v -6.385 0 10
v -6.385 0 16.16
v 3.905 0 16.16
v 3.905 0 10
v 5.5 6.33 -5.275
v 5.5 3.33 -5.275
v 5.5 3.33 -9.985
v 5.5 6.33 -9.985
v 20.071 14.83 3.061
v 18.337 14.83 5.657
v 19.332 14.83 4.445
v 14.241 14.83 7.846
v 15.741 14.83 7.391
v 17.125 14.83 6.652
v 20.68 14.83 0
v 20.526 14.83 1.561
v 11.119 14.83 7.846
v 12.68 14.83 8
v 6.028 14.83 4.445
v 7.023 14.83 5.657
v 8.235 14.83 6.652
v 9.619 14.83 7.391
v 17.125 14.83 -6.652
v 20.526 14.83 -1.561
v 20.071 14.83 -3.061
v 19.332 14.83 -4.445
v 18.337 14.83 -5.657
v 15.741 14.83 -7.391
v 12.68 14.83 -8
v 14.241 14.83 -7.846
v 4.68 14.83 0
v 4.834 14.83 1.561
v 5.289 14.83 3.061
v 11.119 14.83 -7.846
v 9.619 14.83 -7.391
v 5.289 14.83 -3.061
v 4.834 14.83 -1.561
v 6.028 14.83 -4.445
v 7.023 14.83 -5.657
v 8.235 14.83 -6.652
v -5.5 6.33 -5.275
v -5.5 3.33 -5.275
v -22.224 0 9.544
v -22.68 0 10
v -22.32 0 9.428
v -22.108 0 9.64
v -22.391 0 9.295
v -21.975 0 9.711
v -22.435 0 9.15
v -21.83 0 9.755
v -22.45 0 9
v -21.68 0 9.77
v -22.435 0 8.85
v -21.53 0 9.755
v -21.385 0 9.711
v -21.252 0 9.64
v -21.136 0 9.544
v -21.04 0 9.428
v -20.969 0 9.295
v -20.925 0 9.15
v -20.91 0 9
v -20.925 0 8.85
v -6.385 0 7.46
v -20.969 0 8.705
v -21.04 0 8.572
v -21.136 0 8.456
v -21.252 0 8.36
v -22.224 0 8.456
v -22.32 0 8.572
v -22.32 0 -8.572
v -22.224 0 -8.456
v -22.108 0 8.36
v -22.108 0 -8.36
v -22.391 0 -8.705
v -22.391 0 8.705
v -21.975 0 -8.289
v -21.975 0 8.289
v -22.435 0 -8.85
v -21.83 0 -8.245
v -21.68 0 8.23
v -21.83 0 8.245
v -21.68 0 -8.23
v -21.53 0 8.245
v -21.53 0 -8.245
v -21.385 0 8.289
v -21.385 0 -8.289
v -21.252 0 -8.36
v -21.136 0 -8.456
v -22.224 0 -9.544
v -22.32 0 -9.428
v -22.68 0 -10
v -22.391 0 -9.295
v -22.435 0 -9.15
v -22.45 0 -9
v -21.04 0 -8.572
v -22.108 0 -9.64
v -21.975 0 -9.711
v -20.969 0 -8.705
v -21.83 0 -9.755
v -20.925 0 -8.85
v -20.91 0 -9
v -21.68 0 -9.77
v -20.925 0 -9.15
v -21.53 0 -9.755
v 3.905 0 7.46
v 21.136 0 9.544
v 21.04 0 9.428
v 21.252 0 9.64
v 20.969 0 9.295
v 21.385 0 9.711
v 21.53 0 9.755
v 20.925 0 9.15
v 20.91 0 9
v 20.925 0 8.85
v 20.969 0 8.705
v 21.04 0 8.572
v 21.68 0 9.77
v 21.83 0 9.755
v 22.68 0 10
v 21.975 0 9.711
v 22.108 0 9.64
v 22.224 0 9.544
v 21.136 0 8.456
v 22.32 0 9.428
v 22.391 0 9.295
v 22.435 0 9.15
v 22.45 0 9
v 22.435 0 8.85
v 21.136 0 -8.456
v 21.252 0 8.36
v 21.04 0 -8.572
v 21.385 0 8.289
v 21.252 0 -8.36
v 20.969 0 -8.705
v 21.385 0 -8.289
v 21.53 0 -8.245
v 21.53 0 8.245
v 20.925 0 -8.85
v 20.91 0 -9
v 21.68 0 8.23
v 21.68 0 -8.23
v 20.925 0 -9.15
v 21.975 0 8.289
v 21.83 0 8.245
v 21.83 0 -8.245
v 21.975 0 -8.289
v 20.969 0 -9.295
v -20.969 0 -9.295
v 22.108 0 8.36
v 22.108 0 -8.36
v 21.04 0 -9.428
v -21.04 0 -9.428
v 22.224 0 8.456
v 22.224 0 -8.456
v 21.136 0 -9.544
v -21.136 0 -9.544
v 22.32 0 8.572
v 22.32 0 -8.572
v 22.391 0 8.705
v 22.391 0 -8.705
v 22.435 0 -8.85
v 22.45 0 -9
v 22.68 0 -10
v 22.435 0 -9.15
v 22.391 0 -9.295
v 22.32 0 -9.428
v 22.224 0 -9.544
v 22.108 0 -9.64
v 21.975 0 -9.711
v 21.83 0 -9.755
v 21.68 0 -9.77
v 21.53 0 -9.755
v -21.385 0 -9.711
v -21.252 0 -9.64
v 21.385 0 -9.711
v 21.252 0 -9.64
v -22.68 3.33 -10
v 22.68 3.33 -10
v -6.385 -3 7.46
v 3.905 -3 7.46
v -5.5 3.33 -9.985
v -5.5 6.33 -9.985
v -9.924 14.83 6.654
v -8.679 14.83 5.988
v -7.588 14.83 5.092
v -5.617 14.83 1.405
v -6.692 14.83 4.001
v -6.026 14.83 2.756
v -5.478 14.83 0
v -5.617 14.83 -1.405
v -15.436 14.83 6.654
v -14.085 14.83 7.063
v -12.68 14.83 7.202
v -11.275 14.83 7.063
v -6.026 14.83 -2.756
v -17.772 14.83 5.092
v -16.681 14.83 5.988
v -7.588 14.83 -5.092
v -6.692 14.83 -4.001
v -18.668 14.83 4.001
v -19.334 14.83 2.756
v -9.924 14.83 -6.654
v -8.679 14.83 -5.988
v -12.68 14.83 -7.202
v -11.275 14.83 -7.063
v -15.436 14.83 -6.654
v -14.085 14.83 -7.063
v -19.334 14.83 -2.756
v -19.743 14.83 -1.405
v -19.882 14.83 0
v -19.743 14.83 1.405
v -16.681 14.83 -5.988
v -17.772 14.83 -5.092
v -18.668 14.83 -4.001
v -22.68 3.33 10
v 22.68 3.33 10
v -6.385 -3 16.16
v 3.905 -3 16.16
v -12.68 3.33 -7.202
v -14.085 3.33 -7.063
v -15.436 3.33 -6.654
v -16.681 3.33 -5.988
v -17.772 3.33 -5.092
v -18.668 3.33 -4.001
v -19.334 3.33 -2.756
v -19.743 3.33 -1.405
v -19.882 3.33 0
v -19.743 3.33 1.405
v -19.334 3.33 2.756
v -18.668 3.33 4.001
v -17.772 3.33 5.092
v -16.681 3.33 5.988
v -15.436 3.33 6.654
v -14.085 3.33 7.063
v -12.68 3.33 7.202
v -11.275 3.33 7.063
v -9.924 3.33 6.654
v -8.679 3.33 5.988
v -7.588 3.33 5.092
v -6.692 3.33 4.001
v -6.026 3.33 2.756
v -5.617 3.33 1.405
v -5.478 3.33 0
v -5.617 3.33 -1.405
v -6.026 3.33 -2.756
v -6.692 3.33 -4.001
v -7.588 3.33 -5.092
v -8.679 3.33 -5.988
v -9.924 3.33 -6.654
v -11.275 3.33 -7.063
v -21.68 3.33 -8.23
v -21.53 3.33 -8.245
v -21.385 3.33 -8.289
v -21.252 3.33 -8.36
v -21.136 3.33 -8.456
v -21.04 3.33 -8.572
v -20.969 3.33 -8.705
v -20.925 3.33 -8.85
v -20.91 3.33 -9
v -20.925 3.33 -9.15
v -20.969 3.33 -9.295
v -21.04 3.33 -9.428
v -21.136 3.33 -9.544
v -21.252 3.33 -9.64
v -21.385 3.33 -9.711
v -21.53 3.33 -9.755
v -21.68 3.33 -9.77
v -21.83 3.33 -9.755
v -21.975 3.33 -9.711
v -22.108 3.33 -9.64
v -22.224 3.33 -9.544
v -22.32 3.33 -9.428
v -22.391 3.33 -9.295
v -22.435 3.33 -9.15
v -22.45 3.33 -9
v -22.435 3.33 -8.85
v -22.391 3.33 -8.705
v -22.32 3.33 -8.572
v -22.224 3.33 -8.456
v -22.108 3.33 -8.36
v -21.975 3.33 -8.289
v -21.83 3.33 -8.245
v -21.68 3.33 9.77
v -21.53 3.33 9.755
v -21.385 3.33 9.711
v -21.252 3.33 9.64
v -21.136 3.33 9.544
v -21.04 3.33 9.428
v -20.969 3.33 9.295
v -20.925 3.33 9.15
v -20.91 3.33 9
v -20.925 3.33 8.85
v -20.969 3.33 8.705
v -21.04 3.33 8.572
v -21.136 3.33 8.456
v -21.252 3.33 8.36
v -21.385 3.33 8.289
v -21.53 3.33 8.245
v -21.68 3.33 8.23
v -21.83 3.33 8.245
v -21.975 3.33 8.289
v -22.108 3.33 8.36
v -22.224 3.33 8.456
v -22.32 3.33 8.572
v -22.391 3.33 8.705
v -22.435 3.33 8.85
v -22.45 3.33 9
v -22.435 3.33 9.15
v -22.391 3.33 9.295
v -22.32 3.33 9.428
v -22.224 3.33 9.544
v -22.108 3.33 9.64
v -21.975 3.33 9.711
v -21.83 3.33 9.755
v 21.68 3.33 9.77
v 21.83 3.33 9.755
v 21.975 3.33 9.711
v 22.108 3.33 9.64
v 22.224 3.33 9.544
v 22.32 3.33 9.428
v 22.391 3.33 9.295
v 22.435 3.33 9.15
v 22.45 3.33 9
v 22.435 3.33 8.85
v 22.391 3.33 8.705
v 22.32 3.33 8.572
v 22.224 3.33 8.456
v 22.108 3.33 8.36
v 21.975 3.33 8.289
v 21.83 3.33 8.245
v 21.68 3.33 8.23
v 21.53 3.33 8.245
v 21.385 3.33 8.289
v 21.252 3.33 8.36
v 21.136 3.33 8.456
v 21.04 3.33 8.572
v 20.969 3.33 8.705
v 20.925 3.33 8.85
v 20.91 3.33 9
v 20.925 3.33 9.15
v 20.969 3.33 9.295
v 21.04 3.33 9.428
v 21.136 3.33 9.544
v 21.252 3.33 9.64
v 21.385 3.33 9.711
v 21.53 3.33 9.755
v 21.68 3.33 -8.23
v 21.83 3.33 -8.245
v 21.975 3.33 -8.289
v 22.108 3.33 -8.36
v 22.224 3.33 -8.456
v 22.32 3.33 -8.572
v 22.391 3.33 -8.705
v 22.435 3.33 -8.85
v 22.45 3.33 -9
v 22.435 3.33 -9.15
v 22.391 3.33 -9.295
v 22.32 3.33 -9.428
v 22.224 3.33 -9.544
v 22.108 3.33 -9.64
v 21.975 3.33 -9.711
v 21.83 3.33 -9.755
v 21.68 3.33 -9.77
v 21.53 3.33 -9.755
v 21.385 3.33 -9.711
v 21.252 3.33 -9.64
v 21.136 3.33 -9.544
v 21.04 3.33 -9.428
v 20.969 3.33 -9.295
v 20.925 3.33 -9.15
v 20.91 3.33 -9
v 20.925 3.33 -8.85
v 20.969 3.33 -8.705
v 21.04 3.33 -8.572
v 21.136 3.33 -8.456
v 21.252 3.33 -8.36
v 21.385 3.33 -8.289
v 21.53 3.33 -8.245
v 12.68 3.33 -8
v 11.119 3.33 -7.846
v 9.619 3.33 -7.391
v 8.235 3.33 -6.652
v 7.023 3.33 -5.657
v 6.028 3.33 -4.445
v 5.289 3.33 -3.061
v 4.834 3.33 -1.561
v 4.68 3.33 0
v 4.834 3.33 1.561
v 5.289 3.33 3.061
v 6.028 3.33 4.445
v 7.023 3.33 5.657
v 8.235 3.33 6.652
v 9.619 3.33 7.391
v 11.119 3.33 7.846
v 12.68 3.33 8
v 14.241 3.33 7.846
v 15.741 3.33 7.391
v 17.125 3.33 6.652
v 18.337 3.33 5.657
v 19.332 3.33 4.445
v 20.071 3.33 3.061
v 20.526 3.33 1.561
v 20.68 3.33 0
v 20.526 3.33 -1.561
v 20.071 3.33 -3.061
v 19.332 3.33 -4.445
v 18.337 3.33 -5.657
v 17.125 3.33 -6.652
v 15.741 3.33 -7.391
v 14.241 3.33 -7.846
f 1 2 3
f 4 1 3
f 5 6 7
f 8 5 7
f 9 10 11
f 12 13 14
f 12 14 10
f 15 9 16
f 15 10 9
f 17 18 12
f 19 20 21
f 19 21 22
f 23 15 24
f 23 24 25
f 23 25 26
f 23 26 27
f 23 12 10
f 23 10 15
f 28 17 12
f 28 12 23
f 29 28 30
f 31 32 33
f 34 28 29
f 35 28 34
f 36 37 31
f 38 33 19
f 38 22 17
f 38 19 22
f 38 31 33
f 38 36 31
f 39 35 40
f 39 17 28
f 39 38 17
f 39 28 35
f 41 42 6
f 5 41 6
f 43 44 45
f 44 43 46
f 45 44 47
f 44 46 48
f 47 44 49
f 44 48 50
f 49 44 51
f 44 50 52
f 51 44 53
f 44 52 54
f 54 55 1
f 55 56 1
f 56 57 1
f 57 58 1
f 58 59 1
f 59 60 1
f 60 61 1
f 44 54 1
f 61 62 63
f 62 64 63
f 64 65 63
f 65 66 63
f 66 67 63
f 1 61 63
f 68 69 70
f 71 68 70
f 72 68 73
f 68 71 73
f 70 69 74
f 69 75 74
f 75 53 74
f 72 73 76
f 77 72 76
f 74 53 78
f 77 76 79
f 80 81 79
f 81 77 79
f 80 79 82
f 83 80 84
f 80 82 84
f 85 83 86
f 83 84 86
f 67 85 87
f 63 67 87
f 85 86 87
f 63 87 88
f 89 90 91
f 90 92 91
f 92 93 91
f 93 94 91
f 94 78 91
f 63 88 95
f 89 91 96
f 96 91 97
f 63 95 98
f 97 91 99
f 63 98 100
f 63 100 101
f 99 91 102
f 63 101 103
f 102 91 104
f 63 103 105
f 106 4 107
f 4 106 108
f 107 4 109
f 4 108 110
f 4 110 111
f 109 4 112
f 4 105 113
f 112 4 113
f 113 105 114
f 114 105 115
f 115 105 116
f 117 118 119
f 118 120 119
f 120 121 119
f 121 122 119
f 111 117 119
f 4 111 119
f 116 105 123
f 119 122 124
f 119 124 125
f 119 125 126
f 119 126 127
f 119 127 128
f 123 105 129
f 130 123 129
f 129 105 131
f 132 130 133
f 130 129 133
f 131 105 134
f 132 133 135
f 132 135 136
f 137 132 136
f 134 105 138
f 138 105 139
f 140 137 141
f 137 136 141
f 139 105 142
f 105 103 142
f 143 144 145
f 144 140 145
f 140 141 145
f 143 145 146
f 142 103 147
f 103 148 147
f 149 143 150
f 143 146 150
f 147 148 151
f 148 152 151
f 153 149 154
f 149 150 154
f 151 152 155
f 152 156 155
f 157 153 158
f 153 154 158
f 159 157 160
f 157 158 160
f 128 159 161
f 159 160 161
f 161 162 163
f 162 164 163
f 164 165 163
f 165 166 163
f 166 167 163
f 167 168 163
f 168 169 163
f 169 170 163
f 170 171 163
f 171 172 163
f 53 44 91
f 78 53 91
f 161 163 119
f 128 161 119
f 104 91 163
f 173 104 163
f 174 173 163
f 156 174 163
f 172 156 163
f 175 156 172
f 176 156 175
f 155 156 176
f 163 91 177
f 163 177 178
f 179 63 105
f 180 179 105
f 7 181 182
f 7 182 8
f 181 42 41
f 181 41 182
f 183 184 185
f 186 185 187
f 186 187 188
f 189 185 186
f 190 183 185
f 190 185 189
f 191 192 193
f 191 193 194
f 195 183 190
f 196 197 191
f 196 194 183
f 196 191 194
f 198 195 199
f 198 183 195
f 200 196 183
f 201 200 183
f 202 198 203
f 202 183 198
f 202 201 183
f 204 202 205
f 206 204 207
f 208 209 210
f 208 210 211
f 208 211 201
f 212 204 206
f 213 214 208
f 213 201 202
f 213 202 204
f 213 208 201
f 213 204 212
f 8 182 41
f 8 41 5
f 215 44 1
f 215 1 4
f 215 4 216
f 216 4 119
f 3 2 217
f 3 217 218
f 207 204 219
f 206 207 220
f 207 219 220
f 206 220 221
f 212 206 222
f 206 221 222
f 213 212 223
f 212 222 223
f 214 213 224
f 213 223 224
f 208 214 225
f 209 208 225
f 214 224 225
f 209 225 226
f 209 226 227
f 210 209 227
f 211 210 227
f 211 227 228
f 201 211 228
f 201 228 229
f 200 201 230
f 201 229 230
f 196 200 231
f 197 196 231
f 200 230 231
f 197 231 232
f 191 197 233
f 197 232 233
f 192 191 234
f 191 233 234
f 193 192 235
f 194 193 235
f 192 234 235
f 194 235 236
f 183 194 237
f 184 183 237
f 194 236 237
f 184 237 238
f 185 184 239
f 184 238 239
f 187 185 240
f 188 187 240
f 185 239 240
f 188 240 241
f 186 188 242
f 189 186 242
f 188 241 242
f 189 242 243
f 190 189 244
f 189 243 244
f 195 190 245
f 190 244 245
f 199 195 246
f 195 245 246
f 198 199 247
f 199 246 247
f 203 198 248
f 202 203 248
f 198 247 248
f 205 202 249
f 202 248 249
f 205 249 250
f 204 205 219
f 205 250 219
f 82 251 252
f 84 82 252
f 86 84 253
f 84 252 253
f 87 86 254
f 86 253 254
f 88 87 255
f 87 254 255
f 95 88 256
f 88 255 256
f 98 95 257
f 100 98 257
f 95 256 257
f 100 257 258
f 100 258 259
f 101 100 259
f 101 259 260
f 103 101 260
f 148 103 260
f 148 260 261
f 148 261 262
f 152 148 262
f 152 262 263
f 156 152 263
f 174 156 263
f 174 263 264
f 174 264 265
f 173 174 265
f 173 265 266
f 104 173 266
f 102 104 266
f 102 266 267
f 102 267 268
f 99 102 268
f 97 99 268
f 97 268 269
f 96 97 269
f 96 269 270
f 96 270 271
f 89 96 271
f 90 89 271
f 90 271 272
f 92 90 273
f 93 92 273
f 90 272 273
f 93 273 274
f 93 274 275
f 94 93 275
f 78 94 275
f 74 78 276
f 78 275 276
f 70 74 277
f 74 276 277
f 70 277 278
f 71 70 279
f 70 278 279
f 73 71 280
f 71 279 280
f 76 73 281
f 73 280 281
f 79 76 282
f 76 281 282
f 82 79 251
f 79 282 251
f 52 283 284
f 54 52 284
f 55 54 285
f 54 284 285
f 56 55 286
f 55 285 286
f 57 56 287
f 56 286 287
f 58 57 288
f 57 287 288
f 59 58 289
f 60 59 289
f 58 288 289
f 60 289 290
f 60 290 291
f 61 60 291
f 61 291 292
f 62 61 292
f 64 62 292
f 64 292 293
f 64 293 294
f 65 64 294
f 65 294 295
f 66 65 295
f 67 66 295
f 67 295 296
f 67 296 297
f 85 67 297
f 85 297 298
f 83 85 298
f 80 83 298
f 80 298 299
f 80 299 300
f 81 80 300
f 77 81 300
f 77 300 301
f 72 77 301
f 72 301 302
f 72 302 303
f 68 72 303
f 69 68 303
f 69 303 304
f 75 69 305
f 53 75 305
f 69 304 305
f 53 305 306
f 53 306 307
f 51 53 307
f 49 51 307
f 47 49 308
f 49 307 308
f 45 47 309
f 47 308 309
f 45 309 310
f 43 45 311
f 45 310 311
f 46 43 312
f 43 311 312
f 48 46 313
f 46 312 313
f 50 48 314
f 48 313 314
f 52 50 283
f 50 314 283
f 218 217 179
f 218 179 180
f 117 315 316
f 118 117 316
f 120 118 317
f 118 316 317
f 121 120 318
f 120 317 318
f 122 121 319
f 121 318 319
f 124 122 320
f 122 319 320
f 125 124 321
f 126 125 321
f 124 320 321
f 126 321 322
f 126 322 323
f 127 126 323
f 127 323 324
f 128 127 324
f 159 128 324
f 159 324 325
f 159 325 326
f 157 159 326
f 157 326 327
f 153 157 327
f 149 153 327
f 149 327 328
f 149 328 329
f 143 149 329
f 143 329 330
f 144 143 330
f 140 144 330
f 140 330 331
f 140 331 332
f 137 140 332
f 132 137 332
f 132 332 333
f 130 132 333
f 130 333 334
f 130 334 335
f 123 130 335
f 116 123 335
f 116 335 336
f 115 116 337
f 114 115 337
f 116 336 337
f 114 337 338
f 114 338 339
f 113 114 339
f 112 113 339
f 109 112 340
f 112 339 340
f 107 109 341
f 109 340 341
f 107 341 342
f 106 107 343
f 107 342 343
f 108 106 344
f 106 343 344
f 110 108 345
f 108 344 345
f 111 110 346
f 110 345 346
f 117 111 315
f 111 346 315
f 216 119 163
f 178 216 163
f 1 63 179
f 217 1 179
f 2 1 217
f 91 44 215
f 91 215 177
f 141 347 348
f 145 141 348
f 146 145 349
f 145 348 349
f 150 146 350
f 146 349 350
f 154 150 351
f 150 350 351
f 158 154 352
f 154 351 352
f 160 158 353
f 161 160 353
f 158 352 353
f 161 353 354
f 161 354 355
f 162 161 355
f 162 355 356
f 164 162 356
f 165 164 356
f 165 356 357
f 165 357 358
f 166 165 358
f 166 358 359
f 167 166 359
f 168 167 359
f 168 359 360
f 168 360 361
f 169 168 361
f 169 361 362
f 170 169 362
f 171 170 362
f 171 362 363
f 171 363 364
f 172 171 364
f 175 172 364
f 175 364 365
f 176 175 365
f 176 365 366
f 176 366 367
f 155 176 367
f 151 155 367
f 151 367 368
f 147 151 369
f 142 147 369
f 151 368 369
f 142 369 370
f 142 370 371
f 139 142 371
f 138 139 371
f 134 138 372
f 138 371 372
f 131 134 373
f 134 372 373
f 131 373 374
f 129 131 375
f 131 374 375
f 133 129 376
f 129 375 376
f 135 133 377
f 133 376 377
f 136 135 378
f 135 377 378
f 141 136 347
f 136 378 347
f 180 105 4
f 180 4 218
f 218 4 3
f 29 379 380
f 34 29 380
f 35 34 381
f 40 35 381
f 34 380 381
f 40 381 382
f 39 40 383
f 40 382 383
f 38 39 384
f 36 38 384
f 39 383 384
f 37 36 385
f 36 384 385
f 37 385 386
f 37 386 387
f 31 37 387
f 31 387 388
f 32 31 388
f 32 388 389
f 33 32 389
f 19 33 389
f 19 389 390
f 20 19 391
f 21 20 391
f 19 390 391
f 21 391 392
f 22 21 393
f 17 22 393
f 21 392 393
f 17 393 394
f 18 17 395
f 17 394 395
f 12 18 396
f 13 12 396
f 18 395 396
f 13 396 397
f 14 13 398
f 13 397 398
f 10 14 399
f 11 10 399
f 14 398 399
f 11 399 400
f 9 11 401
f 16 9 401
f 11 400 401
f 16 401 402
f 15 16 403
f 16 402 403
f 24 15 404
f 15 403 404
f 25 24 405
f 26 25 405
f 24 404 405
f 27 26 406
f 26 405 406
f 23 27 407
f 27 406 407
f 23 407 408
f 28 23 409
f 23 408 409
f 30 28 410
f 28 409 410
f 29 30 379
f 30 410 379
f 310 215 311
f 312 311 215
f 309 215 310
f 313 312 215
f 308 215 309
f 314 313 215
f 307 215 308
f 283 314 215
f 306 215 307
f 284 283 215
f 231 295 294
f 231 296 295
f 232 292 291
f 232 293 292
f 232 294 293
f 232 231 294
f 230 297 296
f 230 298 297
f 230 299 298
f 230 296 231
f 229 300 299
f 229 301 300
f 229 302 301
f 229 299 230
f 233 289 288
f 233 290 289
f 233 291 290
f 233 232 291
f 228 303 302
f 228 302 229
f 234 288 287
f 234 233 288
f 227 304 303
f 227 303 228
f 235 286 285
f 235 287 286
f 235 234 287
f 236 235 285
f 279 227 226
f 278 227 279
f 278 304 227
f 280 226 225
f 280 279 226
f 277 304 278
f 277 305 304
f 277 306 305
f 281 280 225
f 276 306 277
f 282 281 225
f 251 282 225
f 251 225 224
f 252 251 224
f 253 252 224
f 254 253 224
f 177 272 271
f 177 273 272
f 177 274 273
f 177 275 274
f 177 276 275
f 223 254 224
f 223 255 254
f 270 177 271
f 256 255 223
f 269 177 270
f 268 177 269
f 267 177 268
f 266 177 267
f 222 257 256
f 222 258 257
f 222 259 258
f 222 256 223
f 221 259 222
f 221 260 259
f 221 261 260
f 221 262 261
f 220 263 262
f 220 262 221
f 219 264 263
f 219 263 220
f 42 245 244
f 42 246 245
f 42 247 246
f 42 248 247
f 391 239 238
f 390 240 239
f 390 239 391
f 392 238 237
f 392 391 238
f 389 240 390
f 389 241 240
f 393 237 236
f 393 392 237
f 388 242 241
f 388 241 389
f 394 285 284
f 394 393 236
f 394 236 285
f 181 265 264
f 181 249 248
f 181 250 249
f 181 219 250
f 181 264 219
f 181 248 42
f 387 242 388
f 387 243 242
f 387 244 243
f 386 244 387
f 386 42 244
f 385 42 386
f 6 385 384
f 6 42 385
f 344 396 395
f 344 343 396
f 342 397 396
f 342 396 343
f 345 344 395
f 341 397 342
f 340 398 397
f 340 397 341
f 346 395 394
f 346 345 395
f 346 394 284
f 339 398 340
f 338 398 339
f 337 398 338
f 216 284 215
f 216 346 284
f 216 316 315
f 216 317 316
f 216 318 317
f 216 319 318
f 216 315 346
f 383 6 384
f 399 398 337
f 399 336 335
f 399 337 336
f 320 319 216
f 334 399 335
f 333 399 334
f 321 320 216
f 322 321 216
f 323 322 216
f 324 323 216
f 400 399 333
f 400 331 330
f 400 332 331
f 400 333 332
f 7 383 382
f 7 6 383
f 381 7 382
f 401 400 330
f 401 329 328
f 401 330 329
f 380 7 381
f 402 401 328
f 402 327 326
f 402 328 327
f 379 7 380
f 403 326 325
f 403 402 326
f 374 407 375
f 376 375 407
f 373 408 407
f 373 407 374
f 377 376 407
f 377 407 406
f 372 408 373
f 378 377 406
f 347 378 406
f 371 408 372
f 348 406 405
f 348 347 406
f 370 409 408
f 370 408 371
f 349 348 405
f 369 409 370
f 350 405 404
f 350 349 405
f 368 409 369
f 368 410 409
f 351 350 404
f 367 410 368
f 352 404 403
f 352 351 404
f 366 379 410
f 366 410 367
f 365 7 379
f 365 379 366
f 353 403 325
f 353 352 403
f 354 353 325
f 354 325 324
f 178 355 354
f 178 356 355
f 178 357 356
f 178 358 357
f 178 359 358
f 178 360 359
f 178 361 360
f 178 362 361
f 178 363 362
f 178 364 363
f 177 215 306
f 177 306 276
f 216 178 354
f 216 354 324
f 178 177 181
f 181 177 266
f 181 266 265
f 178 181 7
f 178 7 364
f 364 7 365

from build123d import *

# Parameters (mm, degrees)
SKETCH1_W           = 45.36
SKETCH1_H           = 20
BOSS_EXTRUDE1_DEPTH = 3.33
SKETCH2_R           = 8
SKETCH2_R_2         = 7.201770051
BOSS_EXTRUDE2_DEPTH = 11.5
SKETCH3_R           = 0.77
CUT_EXTRUDE1_DEPTH  = 11.5
SKETCH4_W           = 11
SKETCH4_H           = 4.71
BOSS_EXTRUDE3_DEPTH = 3
SKETCH5_W           = 10.29
SKETCH5_H           = 8.7
BOSS_EXTRUDE4_DEPTH = 3


with BuildPart() as part:
    # Sketch1 → Boss-Extrude1 (new body)
    with BuildSketch(Plane(origin=(0, 0, 0), x_dir=(1, 0, 0), z_dir=(0, 1, 0))):
        Rectangle(SKETCH1_W, SKETCH1_H)
    extrude(amount=BOSS_EXTRUDE1_DEPTH)

    # Sketch2 → Boss-Extrude2 (add)
    with BuildSketch(Plane(origin=(0, 3.33, 0), x_dir=(1, 0, 0), z_dir=(0, 1, 0))):
        with Locations(Location((12.68, 0, 0), (0, 0, 90))):
            Circle(SKETCH2_R)
        with Locations(Location((-12.68, 0, 0), (0, 0, 90))):
            Circle(SKETCH2_R_2)
    extrude(amount=BOSS_EXTRUDE2_DEPTH)

    # Sketch3 → Cut-Extrude1 (cut)
    with BuildSketch(Plane(origin=(0, 3.33, 0), x_dir=(1, 0, 0), z_dir=(0, 1, 0))):
        with Locations(Location((21.68, 9, 0), (0, 0, 270))):
            Circle(SKETCH3_R)
        with Locations(Location((21.68, -9, 0), (0, 0, 270))):
            Circle(SKETCH3_R)
        with Locations(Location((-21.68, -9, 0), (0, 0, 270))):
            Circle(SKETCH3_R)
        with Locations(Location((-21.68, 9, 0), (0, 0, 270))):
            Circle(SKETCH3_R)
    extrude(amount=-CUT_EXTRUDE1_DEPTH, mode=Mode.SUBTRACT)

    # Sketch4 → Boss-Extrude3 (add)
    with BuildSketch(Plane(origin=(0, 3.33, 0), x_dir=(1, 0, 0), z_dir=(0, 1, 0))):
        with Locations((0, 7.63)):
            Rectangle(SKETCH4_W, SKETCH4_H)
    extrude(amount=BOSS_EXTRUDE3_DEPTH)

    # Sketch5 → Boss-Extrude4 (add)
    with BuildSketch(Plane.XZ):
        with Locations((-1.239937646, 11.81)):
            Rectangle(SKETCH5_W, SKETCH5_H)
    extrude(amount=BOSS_EXTRUDE4_DEPTH)


solid = part.part
